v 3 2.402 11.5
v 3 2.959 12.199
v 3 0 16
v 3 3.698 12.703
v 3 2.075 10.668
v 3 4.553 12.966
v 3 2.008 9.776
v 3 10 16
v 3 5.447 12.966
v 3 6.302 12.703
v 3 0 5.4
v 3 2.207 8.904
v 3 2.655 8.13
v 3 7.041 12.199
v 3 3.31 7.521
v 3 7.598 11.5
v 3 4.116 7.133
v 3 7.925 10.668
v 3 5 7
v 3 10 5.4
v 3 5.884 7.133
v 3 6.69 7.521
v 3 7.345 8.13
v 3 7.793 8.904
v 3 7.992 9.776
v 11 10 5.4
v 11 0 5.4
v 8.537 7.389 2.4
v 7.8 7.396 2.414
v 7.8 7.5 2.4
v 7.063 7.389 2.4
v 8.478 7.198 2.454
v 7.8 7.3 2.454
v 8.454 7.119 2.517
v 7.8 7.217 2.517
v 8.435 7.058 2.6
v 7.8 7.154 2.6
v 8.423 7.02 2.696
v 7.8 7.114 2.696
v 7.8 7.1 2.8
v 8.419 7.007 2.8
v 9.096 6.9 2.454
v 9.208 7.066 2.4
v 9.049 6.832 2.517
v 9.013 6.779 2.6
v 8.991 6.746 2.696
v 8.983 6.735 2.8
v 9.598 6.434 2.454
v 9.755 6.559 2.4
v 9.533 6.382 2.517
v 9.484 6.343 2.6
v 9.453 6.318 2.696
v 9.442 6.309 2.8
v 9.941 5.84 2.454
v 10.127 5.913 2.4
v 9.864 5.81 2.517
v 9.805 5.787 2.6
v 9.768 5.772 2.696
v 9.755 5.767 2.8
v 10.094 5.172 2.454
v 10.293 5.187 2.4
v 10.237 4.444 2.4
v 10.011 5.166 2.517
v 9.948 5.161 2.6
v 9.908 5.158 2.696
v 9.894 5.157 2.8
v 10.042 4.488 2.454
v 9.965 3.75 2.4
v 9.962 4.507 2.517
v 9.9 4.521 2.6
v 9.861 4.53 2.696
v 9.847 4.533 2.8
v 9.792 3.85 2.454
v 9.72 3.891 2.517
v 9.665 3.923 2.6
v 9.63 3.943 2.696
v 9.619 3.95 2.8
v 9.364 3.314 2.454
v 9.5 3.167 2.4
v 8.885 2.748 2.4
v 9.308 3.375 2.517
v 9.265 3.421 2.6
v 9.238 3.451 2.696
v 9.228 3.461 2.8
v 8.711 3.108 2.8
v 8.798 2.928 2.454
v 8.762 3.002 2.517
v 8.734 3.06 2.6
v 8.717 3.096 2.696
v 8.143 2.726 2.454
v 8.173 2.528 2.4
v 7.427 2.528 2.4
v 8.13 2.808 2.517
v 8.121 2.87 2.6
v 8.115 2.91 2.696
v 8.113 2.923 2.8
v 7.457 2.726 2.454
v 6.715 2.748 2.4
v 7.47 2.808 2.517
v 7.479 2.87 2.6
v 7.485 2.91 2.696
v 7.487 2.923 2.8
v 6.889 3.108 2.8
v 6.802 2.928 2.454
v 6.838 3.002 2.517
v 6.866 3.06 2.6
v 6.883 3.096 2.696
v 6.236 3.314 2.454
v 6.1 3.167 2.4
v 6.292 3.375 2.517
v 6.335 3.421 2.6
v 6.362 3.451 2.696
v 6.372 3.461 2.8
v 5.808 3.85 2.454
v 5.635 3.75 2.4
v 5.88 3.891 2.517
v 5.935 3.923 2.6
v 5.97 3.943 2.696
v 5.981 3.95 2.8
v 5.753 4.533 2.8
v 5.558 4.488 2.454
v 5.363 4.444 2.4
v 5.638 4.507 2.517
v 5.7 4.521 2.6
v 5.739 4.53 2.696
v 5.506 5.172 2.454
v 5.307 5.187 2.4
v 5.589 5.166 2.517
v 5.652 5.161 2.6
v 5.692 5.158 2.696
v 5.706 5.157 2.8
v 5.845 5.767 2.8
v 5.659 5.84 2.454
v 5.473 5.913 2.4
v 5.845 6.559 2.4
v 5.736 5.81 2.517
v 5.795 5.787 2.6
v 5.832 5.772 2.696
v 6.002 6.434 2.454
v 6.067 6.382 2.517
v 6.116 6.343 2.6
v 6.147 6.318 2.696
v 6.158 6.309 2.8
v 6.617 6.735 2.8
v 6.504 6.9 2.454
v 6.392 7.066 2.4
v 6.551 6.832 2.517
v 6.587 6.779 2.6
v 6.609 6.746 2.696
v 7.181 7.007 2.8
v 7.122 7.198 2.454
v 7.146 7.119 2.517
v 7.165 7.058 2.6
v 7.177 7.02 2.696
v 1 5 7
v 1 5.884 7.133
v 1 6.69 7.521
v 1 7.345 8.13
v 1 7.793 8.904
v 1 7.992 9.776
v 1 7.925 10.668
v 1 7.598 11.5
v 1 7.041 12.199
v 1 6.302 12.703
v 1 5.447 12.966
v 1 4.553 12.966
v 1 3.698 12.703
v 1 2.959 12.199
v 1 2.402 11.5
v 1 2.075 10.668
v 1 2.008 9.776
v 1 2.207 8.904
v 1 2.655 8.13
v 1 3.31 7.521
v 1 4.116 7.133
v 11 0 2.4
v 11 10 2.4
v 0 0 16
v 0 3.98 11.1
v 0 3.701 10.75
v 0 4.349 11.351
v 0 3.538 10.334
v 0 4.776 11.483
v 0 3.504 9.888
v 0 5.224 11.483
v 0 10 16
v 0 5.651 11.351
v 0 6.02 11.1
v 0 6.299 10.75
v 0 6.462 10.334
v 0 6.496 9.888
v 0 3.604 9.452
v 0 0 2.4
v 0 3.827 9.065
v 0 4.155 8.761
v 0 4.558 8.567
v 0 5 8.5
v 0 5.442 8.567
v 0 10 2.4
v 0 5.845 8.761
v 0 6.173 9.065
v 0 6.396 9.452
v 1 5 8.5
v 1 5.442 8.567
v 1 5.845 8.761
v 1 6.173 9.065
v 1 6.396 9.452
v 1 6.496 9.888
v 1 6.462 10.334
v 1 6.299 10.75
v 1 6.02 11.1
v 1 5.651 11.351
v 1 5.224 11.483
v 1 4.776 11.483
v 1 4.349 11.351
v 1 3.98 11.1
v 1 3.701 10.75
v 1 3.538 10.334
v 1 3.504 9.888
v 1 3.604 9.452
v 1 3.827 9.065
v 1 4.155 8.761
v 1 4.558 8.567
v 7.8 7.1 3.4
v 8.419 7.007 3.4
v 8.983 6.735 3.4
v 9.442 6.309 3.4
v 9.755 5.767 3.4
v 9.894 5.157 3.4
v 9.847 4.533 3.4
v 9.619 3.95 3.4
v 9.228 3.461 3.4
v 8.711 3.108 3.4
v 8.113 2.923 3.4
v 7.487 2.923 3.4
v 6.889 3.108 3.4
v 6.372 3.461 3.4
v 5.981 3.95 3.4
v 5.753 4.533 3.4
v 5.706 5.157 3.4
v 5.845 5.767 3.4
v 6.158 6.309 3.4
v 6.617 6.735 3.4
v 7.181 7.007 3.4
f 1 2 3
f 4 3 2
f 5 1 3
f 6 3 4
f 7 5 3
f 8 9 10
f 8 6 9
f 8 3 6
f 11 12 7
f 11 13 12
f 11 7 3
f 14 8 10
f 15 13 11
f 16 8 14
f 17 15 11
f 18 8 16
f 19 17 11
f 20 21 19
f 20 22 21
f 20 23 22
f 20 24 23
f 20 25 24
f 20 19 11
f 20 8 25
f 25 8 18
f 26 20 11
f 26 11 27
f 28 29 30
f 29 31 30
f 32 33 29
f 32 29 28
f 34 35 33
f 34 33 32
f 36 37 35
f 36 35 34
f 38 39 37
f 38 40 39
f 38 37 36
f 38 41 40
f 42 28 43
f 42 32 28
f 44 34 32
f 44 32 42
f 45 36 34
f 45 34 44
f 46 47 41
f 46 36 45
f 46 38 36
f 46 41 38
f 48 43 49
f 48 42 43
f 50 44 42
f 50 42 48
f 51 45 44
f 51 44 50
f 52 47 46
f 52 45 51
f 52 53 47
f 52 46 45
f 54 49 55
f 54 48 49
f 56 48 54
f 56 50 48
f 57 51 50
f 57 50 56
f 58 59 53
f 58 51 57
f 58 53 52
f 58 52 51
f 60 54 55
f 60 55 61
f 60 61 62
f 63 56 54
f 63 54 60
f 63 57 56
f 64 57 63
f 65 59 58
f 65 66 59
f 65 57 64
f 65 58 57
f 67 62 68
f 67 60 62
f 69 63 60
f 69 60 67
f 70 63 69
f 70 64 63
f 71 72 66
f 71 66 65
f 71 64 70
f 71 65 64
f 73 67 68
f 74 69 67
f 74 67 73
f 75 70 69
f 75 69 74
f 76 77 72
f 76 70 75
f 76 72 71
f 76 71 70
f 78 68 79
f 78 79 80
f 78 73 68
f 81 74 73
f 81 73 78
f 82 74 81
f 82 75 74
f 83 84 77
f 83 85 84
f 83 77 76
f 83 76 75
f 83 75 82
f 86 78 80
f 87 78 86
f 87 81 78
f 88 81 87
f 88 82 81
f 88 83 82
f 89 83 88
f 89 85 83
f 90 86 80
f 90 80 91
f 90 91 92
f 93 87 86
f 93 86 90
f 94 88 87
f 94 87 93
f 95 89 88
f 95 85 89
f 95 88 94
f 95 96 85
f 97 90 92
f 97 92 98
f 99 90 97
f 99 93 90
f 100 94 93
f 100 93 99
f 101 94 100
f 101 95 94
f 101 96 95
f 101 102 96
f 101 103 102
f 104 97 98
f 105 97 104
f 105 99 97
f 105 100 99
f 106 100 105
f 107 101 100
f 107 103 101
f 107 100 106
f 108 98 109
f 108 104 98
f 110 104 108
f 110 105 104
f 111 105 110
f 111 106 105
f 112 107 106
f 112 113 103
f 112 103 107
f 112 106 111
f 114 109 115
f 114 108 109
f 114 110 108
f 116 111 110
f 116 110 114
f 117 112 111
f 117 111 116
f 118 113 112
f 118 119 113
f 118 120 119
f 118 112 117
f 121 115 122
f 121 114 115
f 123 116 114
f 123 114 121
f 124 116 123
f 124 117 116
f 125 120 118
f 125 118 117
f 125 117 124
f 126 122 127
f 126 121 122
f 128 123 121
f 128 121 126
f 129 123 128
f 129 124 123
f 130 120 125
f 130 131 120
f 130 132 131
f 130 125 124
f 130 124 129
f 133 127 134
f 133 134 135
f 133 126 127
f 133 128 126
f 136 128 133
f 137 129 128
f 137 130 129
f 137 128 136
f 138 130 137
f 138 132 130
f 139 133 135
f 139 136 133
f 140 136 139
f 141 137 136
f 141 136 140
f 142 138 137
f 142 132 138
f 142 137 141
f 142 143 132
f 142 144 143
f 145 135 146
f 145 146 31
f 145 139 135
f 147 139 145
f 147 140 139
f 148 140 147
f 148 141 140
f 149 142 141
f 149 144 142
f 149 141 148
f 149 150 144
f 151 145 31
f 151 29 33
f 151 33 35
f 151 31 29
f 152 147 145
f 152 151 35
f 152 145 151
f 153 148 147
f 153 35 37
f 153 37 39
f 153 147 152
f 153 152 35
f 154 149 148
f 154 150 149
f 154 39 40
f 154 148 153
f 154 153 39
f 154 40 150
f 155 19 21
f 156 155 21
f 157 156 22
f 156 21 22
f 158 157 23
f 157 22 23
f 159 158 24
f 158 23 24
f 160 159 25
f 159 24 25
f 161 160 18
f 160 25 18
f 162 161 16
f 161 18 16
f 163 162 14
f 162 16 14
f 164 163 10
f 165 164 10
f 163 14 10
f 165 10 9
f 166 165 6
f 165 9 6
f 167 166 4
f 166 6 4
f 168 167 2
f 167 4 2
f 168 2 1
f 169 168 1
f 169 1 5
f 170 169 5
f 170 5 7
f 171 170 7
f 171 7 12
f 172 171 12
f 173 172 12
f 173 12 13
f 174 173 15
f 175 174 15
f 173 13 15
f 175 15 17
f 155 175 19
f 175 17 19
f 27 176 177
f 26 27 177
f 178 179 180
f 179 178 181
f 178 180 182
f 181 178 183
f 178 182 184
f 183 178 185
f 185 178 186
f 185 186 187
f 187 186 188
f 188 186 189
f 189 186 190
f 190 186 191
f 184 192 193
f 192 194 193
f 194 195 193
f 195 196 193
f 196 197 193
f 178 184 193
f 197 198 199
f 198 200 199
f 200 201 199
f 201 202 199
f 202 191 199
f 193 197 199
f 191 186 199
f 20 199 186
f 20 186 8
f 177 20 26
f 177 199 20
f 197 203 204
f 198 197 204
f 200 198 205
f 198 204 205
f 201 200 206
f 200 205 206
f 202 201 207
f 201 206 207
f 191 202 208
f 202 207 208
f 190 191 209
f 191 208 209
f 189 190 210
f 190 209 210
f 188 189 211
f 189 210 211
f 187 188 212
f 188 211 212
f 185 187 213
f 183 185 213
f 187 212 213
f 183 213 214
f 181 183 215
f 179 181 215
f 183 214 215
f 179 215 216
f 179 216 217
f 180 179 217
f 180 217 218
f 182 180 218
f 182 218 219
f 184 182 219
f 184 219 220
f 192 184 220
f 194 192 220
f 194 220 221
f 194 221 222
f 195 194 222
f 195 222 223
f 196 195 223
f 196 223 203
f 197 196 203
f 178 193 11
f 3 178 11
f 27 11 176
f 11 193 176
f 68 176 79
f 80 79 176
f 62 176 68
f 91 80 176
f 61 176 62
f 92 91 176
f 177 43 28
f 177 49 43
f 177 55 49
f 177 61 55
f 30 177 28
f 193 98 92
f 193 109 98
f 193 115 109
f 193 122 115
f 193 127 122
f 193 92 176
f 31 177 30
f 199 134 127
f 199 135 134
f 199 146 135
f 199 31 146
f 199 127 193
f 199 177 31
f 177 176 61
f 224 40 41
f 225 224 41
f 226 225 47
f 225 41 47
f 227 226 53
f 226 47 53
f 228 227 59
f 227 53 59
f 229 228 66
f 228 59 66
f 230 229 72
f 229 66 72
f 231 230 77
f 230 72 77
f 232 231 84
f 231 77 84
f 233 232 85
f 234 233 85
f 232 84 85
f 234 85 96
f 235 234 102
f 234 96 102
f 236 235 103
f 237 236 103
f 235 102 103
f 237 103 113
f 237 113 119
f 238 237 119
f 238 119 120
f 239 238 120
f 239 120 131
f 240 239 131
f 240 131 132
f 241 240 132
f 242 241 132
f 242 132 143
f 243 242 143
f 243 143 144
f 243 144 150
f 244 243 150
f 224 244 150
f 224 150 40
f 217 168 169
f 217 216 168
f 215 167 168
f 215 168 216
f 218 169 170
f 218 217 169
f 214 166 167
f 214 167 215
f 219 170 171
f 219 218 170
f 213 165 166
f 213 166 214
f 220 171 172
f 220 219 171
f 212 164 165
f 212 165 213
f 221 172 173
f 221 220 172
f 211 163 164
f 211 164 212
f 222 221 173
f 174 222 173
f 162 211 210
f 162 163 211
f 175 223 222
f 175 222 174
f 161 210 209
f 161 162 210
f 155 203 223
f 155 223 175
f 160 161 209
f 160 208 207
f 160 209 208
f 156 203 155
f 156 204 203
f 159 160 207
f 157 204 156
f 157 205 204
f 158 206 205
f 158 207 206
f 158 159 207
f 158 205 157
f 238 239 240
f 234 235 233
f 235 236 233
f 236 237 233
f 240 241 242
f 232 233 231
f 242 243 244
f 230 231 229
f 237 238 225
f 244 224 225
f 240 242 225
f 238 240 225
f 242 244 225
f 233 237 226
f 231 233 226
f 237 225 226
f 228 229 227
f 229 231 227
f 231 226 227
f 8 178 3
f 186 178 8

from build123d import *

# Parameters (mm, degrees)
SKETCH_1_W          = 16
SKETCH_1_H          = 10
EXTRUDE_1_DEPTH     = 3
SKETCH_2_W          = 3
SKETCH_2_H          = 10
EXTRUDE_2_DEPTH     = 8
SKETCH_3_R          = 1.5
CUT_EXTRUDE_1_DEPTH = 3
SKETCH_5_R          = 3
CUT_EXTRUDE_3_DEPTH = 2
SKETCH_7_W          = 0.4
SKETCH_7_H          = 10
CUT_EXTRUDE_4_DEPTH = 22
SKETCH_8_R          = 2.1
CUT_EXTRUDE_5_DEPTH = 4.2
SKETCH_9_W          = 8
SKETCH_9_H          = 10
EXTRUDE_3_DEPTH     = 2
SKETCH_10_W         = 11
SKETCH_10_H         = 10
CUT_EXTRUDE_6_DEPTH = 2
FILLET_1_R          = 0.4


with BuildPart() as part:
    # 草图1 → 凸台-拉伸1 (new body)
    with BuildSketch(Plane(origin=(0, 0, 0), x_dir=(0, 0, -1), z_dir=(1, 0, 0))):
        with Locations((-8, 5)):
            Rectangle(SKETCH_1_W, SKETCH_1_H)
    extrude(amount=EXTRUDE_1_DEPTH)

    # 草图2 → 凸台-拉伸2 (add)
    with BuildSketch(Plane(origin=(3, 0, 0), x_dir=(0, 0, -1), z_dir=(1, 0, 0))):
        with Locations((-1.9, 5)):
            Rectangle(SKETCH_2_W, SKETCH_2_H)
    extrude(amount=EXTRUDE_2_DEPTH)

    # 草图3 → 切除-拉伸1 (cut)
    with BuildSketch(Plane(origin=(3, 0, 0), x_dir=(0, 0, -1), z_dir=(1, 0, 0))):
        with Locations((-10, 5)):
            Circle(SKETCH_3_R)
    extrude(amount=-CUT_EXTRUDE_1_DEPTH, mode=Mode.SUBTRACT)

    # 草图5 → 切除-拉伸3 (cut)
    with BuildSketch(Plane(origin=(3, 0, 0), x_dir=(0, 0, -1), z_dir=(1, 0, 0))):
        with Locations((-10, 5)):
            Circle(SKETCH_5_R)
    extrude(amount=-CUT_EXTRUDE_3_DEPTH, mode=Mode.SUBTRACT)

    # 草图7 → 切除-拉伸4 (cut)
    with BuildSketch(Plane(origin=(3, 0, 0), x_dir=(0, 0, -1), z_dir=(1, 0, 0))):
        with Locations((-0.2, 5)):
            Rectangle(SKETCH_7_W, SKETCH_7_H)
    extrude(amount=-CUT_EXTRUDE_4_DEPTH, mode=Mode.SUBTRACT)

    # 草图8 → 切除-拉伸5 (cut)
    with BuildSketch(Plane(origin=(0, 0, 0.4), x_dir=(-1, 0, 0), z_dir=(0, 0, -1))):
        with Locations(Location((-7.8, 5, 0), (0, 0, 90))):
            Circle(SKETCH_8_R)
    extrude(amount=-CUT_EXTRUDE_5_DEPTH, mode=Mode.SUBTRACT)

    # 草图9 → 凸台-拉伸3 (add)
    with BuildSketch(Plane.XY.offset(3.4)):
        with Locations((7, 5)):
            Rectangle(SKETCH_9_W, SKETCH_9_H)
    extrude(amount=EXTRUDE_3_DEPTH)

    # 草图10 → 切除-拉伸6 (cut)
    with BuildSketch(Plane(origin=(0, 0, 0.4), x_dir=(-1, 0, 0), z_dir=(0, 0, -1))):
        with Locations((-5.5, 5)):
            Rectangle(SKETCH_10_W, SKETCH_10_H)
    extrude(amount=-CUT_EXTRUDE_6_DEPTH, mode=Mode.SUBTRACT)

    # 圆角1
    fillet_1_edges = [part.edges().sort_by_distance(p)[0] for p in [
        (7.8, 2.9, 2.4),
    ]]
    fillet(fillet_1_edges, radius=FILLET_1_R)


solid = part.part
